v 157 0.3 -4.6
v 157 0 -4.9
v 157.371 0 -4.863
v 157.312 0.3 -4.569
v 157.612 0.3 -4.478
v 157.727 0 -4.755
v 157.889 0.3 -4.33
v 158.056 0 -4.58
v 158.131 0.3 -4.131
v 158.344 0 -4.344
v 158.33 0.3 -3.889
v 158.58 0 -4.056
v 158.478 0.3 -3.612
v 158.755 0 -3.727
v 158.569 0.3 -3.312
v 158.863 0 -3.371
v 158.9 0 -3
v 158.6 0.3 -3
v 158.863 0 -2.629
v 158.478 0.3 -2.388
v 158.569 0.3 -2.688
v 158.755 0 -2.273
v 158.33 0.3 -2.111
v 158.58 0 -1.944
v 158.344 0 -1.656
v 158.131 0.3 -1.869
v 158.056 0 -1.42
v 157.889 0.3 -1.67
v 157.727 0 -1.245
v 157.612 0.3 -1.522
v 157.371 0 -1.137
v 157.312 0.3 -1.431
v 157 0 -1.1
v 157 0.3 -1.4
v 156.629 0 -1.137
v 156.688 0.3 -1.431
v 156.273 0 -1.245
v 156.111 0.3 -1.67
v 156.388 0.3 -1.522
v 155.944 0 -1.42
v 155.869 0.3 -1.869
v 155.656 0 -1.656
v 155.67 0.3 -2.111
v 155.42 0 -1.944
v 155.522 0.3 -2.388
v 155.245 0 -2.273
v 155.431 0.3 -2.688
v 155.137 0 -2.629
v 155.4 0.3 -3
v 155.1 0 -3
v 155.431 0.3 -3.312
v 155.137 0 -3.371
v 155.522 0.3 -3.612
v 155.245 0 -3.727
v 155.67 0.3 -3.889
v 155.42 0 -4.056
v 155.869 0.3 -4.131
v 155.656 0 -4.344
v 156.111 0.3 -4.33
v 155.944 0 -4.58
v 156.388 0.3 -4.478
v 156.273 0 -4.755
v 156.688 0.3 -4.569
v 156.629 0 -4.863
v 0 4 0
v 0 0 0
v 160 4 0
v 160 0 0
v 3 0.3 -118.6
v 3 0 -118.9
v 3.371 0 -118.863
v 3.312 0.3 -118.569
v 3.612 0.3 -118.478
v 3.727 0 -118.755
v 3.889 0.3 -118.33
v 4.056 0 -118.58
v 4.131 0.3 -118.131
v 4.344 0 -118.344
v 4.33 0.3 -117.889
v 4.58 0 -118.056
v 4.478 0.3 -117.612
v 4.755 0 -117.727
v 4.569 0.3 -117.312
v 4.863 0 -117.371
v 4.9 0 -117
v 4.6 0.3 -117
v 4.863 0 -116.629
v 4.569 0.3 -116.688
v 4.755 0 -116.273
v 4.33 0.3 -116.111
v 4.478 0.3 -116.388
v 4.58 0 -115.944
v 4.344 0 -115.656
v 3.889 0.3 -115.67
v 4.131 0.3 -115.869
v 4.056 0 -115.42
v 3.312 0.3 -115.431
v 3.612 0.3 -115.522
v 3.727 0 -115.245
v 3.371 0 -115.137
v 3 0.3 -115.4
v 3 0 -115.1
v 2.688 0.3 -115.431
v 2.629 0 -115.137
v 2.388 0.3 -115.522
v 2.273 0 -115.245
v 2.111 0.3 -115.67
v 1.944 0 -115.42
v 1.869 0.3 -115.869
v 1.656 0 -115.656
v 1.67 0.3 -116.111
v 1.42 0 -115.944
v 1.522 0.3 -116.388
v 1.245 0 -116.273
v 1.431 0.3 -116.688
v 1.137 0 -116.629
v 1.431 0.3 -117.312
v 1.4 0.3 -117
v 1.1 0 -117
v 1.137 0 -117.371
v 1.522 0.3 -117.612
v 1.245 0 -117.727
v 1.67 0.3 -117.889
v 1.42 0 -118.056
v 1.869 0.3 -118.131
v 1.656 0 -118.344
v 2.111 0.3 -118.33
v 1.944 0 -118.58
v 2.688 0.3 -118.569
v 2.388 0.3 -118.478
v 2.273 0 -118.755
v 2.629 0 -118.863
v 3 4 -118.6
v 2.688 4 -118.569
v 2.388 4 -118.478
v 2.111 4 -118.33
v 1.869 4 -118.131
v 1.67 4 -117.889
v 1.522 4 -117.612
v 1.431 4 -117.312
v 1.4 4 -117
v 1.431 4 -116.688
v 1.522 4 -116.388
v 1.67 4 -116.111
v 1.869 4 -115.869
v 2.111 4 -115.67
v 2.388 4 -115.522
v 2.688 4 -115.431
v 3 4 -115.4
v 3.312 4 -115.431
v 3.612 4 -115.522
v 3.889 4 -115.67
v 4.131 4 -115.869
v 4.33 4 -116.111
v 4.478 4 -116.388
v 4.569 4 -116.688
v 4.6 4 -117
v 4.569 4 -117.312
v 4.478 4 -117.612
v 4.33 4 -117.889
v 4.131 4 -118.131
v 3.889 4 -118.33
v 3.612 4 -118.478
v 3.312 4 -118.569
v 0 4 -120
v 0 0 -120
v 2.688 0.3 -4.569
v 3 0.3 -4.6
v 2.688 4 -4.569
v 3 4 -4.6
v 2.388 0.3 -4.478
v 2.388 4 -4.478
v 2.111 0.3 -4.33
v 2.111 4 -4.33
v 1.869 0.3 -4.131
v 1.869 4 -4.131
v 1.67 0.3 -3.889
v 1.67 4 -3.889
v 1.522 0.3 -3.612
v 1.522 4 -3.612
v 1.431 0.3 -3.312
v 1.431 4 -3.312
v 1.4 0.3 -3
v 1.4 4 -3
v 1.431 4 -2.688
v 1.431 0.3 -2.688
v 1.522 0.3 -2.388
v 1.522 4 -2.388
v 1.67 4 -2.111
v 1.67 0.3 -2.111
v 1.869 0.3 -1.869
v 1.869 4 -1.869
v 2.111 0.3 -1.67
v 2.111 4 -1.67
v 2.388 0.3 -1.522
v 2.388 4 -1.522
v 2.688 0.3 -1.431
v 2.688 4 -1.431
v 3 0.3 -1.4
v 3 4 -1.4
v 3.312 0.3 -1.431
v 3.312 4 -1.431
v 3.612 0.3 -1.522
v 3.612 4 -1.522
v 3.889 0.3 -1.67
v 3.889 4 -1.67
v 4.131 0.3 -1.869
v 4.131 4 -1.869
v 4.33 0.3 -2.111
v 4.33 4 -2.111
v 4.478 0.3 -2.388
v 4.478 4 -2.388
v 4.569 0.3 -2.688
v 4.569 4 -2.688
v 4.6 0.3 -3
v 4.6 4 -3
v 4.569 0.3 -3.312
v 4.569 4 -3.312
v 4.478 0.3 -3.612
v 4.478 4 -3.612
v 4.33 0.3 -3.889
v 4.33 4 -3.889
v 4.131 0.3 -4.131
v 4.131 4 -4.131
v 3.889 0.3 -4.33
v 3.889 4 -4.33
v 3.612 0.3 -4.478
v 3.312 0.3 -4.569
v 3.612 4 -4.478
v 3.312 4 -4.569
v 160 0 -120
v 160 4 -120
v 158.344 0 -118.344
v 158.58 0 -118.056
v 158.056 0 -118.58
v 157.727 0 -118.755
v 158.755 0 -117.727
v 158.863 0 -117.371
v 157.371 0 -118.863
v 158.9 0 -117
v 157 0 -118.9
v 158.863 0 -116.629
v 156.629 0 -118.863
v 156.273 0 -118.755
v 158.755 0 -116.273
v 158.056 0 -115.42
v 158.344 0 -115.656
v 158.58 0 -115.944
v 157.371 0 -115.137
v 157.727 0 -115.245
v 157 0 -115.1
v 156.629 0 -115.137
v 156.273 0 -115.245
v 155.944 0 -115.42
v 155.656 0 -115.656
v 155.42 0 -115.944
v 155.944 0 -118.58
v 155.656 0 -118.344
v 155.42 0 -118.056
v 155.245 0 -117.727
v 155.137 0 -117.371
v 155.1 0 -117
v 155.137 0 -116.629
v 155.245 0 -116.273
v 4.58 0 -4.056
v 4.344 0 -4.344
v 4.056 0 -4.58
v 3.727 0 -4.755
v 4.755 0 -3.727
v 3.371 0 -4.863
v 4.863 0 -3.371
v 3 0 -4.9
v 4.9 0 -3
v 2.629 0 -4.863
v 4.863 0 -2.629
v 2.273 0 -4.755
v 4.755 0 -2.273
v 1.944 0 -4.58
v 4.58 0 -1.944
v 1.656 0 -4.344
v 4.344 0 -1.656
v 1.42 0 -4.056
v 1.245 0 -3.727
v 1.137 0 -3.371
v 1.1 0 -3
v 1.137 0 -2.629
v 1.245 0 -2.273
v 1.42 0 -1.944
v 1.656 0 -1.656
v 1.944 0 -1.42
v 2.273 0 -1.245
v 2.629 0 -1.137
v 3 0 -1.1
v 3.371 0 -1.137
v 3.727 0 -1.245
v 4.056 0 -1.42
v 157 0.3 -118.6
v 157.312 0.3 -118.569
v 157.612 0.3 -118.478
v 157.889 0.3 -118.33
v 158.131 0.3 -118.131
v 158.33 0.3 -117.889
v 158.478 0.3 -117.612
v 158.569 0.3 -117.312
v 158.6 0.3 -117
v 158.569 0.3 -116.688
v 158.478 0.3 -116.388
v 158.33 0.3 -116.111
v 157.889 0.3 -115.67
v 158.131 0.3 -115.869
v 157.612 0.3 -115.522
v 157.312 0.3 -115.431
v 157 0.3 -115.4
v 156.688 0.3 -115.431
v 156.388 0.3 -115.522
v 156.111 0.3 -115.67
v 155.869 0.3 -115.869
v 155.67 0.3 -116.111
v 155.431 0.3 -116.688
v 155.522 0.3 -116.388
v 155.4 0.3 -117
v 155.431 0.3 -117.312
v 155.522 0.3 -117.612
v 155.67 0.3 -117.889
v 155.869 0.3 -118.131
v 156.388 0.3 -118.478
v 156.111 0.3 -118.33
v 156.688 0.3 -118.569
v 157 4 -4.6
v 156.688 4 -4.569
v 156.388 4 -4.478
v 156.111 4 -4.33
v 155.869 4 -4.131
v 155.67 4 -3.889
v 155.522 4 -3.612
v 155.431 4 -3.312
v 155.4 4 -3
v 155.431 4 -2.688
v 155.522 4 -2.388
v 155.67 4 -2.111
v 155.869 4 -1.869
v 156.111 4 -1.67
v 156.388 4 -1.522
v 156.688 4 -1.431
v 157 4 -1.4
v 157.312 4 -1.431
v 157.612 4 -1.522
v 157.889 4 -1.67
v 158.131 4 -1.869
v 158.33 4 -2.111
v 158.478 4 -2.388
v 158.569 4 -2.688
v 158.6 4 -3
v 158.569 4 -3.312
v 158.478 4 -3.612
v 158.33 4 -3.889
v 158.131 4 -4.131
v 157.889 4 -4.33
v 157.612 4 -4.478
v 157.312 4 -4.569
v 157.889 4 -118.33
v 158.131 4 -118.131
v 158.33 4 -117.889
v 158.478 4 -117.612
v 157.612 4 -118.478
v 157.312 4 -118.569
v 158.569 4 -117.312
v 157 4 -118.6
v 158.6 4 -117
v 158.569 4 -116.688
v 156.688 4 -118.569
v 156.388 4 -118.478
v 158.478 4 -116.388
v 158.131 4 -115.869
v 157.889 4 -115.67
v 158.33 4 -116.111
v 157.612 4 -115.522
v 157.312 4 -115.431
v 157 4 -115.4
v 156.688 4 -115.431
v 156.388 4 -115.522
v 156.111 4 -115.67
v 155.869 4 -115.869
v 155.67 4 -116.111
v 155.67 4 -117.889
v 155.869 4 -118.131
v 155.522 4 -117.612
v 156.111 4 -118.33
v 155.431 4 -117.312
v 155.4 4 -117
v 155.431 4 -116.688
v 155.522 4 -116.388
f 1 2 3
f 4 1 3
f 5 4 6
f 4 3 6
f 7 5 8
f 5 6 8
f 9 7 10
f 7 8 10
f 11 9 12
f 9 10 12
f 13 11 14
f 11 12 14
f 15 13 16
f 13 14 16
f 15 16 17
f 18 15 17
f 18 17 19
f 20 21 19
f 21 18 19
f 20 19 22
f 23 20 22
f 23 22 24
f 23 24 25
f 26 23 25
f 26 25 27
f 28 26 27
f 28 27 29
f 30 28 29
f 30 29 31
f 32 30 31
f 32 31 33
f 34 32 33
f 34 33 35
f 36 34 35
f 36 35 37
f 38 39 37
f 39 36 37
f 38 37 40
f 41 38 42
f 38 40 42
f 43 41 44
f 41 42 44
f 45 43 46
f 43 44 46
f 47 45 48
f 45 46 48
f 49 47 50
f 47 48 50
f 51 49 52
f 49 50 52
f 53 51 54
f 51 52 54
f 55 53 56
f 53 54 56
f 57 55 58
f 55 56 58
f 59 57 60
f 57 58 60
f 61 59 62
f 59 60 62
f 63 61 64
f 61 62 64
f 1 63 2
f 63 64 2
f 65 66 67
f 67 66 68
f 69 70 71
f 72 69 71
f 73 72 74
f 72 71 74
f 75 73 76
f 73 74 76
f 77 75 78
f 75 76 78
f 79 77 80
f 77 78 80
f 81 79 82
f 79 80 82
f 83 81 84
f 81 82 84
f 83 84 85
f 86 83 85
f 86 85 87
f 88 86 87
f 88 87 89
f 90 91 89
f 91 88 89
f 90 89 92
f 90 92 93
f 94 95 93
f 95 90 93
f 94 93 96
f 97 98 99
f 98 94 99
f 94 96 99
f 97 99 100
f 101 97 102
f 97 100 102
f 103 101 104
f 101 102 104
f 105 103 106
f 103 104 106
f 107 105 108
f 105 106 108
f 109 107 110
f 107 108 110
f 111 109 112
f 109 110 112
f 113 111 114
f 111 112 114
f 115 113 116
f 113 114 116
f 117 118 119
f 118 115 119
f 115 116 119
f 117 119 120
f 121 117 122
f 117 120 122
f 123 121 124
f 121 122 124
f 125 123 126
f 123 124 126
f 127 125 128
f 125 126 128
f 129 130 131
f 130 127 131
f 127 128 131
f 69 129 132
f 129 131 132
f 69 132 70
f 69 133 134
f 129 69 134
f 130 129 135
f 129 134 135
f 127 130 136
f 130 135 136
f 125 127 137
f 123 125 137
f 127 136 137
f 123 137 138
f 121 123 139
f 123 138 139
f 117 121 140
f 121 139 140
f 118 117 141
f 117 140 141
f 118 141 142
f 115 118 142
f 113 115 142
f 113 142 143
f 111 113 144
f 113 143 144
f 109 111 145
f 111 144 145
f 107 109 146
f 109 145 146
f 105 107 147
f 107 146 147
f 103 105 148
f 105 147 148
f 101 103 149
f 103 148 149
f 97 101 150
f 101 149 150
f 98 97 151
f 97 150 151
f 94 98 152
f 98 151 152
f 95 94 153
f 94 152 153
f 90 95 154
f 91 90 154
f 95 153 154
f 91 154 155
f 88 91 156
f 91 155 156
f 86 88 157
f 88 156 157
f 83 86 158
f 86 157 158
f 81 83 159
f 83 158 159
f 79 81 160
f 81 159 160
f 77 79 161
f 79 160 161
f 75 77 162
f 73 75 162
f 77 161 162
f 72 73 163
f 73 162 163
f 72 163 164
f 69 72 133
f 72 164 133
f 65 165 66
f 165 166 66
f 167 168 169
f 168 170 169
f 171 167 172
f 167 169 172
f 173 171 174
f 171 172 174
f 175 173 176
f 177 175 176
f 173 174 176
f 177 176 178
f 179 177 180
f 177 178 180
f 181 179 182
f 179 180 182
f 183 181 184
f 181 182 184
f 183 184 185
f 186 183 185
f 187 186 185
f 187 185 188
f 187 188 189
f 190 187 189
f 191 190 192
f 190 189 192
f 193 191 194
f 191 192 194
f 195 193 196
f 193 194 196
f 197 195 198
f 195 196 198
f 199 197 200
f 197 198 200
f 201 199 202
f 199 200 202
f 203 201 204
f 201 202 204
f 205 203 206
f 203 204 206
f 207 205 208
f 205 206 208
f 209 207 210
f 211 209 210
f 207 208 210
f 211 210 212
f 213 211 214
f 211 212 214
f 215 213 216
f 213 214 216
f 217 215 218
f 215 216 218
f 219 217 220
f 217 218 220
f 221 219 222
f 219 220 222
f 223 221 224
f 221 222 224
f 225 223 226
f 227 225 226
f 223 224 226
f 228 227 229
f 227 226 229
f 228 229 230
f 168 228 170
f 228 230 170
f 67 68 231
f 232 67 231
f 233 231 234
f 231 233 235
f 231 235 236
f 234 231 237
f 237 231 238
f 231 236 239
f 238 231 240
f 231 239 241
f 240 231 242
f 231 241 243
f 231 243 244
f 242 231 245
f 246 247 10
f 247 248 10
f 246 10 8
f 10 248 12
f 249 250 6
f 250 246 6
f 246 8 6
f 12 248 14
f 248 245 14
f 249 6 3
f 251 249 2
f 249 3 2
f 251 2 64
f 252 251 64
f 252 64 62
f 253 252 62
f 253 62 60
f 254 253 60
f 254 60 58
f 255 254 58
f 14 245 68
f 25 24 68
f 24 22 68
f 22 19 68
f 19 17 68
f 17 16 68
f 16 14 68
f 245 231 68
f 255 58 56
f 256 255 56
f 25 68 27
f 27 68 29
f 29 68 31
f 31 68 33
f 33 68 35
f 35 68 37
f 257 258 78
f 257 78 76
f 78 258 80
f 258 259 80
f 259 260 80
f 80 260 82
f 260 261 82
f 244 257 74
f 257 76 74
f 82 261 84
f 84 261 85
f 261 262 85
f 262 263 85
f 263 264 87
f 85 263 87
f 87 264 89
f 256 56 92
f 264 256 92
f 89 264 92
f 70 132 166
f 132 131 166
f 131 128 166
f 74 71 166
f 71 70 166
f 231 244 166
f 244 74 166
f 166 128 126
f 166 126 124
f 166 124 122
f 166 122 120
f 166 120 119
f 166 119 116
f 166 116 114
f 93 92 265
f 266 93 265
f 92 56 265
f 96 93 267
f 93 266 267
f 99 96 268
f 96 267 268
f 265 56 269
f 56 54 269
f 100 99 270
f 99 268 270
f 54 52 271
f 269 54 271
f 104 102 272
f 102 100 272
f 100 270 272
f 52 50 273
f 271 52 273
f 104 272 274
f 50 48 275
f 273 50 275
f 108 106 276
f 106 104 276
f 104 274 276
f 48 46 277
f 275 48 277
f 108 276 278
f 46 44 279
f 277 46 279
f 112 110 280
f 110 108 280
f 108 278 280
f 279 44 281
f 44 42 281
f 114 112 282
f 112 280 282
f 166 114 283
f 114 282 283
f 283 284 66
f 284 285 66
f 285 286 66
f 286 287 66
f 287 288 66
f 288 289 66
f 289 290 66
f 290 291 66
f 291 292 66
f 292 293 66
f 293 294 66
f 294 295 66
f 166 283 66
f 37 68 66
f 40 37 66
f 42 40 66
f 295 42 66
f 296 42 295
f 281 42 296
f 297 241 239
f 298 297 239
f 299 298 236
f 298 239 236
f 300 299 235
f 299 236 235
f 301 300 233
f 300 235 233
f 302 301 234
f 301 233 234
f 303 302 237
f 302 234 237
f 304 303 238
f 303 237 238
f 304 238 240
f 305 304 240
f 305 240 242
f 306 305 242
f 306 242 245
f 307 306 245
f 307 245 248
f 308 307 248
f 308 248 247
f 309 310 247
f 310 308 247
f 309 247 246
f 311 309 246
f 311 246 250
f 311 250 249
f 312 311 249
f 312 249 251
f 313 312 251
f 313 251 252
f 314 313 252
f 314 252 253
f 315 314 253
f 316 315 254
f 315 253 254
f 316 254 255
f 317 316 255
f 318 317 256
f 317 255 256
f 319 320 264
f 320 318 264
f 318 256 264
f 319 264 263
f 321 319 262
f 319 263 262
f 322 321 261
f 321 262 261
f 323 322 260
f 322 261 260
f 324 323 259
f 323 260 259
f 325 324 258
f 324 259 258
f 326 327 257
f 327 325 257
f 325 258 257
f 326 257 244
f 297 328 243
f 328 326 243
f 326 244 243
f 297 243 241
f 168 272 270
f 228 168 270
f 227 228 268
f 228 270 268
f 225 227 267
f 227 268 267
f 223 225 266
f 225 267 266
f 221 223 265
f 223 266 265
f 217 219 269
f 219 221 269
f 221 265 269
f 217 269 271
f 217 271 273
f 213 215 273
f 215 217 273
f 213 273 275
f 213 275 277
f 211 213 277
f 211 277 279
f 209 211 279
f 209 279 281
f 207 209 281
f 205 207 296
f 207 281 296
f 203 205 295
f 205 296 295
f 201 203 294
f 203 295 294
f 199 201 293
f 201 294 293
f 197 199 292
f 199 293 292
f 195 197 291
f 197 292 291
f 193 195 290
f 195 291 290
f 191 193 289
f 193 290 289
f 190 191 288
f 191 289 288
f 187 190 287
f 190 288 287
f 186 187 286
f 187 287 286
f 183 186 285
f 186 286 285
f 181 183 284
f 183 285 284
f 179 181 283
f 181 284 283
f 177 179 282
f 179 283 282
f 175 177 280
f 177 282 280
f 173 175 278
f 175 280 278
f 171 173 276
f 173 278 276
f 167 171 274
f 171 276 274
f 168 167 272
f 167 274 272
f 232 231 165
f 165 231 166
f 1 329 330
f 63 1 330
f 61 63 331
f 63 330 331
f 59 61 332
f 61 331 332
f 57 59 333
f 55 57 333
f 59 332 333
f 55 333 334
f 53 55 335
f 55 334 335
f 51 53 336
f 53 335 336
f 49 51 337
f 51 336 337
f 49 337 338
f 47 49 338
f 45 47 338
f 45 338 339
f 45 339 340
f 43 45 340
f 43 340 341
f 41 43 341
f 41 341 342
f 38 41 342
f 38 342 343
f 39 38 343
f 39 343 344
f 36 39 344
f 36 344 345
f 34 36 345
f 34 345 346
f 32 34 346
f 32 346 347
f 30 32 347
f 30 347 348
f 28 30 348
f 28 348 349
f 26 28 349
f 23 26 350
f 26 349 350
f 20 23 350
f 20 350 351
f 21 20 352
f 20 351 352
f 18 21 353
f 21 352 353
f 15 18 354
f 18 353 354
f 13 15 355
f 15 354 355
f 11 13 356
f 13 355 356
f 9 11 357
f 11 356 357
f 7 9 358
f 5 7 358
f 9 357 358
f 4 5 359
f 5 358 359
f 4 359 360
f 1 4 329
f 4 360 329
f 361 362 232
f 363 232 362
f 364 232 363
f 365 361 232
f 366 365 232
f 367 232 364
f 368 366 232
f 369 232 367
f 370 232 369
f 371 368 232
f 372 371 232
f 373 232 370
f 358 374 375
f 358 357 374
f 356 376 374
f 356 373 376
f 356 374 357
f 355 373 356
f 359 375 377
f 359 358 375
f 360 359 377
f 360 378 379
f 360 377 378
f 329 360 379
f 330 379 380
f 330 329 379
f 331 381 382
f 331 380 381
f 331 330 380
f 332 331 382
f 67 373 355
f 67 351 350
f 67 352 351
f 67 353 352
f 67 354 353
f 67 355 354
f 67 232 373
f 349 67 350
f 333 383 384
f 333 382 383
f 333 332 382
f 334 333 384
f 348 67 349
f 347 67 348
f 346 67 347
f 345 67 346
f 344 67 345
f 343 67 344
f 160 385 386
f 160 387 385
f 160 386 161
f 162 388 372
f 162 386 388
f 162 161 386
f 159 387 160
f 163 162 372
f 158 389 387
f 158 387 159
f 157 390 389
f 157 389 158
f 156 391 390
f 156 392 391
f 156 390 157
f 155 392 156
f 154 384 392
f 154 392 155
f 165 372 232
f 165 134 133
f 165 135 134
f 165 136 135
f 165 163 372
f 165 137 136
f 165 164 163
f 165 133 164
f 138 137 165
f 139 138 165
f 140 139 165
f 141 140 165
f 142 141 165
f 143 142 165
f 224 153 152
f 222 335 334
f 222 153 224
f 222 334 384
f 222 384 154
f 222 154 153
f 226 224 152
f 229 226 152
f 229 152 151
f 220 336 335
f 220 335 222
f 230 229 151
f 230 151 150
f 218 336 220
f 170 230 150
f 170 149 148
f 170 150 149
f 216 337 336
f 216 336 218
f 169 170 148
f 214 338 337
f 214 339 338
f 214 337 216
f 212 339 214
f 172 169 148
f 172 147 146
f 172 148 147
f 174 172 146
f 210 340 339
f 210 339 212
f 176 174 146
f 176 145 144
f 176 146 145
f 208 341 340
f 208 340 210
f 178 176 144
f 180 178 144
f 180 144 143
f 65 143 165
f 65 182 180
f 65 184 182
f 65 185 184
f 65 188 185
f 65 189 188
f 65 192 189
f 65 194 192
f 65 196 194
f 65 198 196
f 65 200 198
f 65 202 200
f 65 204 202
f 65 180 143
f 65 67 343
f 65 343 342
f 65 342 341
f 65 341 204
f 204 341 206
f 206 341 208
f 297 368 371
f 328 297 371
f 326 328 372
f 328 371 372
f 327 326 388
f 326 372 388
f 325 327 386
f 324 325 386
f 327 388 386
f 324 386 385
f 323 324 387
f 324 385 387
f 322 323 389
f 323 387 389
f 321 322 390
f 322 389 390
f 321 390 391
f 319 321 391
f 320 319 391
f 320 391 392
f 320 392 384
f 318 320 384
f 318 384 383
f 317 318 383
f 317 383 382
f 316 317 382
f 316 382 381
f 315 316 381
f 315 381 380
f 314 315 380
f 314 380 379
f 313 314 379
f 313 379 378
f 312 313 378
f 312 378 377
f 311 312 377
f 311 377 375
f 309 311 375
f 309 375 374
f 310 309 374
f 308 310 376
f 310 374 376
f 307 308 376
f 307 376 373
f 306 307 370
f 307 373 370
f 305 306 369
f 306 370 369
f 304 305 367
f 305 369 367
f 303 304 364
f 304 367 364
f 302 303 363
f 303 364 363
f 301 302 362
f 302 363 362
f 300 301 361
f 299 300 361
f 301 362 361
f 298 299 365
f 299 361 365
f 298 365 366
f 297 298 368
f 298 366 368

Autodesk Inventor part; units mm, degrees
ref_plane "YZ Plane" through (0, 0, 0) normal (1, 0, 0) x (0, 1, 0)
ref_plane "XZ Plane" through (0, 0, 0) normal (0, 1, 0) x (-1, 0, 0)
ref_plane "XY Plane" through (0, 0, 0) normal (0, 0, 1) x (1, 0, 0)
sketch "Sketch1" plane through (0, 0, 0) normal (0, 1, 0) x (-1, 0, 0)
  line L0 (0, 0) -> (-160, 0)
  line L1 (-160, 0) -> (-160, -120)
  line L2 (-160, -120) -> (0, -120)
  line L3 (0, -120) -> (0, 0)
  dimension "d0" = 160
  dimension "d1" = 120
extrude "Extrusion1" add sketch "Sketch1" along normal blind 4
sketch "Sketch2" plane through (0, 0, 0) normal (0, -1, 0) x (1, 0, 0)
  line L0 (157, -3) -> (3, -3) construction
  line L1 (3, -3) -> (3, -117) construction
  line L2 (3, -117) -> (157, -117) construction
  line L3 (157, -117) -> (157, -3) construction
  line L4 (0, 0) -> (160, 0) construction
  line L5 (160, -120) -> (0, -120) construction
  line L6 (160, 0) -> (160, -120) construction
  line L7 (0, -120) -> (0, 0) construction
  circle A0 centre (157, -3) radius 1 construction
  circle A1 centre (157, -117) radius 1 construction
  circle A2 centre (3, -117) radius 1 construction
  circle A3 centre (3, -3) radius 1 construction
  dimension "d4" = 3
  dimension "d5" = 3
  dimension "d6" = 3
  dimension "d7" = 3
  dimension "d8" = 2
  dimension "d9" = 2
  dimension "d10" = 2
  dimension "d11" = 2
hole "Hole1" at (3, 0, -3) at (3, 0, -117) at (157, 0, -117) at (157, 0, -3) direction (0, 1, 0) diameter 3.2 depth 7.2 tip angle 118
chamfer "Chamfer1" distance 0.3 angle 45 4 edges at (157, 0, -115.4) (3, 0, -115.4) (157, 0, -1.4) (3, 0, -1.4)
equation "\"d4\" = d5"
equation "\"d6\" = d5"
equation "\"d7\" = d5"
properties part number "plyta-dolna"
